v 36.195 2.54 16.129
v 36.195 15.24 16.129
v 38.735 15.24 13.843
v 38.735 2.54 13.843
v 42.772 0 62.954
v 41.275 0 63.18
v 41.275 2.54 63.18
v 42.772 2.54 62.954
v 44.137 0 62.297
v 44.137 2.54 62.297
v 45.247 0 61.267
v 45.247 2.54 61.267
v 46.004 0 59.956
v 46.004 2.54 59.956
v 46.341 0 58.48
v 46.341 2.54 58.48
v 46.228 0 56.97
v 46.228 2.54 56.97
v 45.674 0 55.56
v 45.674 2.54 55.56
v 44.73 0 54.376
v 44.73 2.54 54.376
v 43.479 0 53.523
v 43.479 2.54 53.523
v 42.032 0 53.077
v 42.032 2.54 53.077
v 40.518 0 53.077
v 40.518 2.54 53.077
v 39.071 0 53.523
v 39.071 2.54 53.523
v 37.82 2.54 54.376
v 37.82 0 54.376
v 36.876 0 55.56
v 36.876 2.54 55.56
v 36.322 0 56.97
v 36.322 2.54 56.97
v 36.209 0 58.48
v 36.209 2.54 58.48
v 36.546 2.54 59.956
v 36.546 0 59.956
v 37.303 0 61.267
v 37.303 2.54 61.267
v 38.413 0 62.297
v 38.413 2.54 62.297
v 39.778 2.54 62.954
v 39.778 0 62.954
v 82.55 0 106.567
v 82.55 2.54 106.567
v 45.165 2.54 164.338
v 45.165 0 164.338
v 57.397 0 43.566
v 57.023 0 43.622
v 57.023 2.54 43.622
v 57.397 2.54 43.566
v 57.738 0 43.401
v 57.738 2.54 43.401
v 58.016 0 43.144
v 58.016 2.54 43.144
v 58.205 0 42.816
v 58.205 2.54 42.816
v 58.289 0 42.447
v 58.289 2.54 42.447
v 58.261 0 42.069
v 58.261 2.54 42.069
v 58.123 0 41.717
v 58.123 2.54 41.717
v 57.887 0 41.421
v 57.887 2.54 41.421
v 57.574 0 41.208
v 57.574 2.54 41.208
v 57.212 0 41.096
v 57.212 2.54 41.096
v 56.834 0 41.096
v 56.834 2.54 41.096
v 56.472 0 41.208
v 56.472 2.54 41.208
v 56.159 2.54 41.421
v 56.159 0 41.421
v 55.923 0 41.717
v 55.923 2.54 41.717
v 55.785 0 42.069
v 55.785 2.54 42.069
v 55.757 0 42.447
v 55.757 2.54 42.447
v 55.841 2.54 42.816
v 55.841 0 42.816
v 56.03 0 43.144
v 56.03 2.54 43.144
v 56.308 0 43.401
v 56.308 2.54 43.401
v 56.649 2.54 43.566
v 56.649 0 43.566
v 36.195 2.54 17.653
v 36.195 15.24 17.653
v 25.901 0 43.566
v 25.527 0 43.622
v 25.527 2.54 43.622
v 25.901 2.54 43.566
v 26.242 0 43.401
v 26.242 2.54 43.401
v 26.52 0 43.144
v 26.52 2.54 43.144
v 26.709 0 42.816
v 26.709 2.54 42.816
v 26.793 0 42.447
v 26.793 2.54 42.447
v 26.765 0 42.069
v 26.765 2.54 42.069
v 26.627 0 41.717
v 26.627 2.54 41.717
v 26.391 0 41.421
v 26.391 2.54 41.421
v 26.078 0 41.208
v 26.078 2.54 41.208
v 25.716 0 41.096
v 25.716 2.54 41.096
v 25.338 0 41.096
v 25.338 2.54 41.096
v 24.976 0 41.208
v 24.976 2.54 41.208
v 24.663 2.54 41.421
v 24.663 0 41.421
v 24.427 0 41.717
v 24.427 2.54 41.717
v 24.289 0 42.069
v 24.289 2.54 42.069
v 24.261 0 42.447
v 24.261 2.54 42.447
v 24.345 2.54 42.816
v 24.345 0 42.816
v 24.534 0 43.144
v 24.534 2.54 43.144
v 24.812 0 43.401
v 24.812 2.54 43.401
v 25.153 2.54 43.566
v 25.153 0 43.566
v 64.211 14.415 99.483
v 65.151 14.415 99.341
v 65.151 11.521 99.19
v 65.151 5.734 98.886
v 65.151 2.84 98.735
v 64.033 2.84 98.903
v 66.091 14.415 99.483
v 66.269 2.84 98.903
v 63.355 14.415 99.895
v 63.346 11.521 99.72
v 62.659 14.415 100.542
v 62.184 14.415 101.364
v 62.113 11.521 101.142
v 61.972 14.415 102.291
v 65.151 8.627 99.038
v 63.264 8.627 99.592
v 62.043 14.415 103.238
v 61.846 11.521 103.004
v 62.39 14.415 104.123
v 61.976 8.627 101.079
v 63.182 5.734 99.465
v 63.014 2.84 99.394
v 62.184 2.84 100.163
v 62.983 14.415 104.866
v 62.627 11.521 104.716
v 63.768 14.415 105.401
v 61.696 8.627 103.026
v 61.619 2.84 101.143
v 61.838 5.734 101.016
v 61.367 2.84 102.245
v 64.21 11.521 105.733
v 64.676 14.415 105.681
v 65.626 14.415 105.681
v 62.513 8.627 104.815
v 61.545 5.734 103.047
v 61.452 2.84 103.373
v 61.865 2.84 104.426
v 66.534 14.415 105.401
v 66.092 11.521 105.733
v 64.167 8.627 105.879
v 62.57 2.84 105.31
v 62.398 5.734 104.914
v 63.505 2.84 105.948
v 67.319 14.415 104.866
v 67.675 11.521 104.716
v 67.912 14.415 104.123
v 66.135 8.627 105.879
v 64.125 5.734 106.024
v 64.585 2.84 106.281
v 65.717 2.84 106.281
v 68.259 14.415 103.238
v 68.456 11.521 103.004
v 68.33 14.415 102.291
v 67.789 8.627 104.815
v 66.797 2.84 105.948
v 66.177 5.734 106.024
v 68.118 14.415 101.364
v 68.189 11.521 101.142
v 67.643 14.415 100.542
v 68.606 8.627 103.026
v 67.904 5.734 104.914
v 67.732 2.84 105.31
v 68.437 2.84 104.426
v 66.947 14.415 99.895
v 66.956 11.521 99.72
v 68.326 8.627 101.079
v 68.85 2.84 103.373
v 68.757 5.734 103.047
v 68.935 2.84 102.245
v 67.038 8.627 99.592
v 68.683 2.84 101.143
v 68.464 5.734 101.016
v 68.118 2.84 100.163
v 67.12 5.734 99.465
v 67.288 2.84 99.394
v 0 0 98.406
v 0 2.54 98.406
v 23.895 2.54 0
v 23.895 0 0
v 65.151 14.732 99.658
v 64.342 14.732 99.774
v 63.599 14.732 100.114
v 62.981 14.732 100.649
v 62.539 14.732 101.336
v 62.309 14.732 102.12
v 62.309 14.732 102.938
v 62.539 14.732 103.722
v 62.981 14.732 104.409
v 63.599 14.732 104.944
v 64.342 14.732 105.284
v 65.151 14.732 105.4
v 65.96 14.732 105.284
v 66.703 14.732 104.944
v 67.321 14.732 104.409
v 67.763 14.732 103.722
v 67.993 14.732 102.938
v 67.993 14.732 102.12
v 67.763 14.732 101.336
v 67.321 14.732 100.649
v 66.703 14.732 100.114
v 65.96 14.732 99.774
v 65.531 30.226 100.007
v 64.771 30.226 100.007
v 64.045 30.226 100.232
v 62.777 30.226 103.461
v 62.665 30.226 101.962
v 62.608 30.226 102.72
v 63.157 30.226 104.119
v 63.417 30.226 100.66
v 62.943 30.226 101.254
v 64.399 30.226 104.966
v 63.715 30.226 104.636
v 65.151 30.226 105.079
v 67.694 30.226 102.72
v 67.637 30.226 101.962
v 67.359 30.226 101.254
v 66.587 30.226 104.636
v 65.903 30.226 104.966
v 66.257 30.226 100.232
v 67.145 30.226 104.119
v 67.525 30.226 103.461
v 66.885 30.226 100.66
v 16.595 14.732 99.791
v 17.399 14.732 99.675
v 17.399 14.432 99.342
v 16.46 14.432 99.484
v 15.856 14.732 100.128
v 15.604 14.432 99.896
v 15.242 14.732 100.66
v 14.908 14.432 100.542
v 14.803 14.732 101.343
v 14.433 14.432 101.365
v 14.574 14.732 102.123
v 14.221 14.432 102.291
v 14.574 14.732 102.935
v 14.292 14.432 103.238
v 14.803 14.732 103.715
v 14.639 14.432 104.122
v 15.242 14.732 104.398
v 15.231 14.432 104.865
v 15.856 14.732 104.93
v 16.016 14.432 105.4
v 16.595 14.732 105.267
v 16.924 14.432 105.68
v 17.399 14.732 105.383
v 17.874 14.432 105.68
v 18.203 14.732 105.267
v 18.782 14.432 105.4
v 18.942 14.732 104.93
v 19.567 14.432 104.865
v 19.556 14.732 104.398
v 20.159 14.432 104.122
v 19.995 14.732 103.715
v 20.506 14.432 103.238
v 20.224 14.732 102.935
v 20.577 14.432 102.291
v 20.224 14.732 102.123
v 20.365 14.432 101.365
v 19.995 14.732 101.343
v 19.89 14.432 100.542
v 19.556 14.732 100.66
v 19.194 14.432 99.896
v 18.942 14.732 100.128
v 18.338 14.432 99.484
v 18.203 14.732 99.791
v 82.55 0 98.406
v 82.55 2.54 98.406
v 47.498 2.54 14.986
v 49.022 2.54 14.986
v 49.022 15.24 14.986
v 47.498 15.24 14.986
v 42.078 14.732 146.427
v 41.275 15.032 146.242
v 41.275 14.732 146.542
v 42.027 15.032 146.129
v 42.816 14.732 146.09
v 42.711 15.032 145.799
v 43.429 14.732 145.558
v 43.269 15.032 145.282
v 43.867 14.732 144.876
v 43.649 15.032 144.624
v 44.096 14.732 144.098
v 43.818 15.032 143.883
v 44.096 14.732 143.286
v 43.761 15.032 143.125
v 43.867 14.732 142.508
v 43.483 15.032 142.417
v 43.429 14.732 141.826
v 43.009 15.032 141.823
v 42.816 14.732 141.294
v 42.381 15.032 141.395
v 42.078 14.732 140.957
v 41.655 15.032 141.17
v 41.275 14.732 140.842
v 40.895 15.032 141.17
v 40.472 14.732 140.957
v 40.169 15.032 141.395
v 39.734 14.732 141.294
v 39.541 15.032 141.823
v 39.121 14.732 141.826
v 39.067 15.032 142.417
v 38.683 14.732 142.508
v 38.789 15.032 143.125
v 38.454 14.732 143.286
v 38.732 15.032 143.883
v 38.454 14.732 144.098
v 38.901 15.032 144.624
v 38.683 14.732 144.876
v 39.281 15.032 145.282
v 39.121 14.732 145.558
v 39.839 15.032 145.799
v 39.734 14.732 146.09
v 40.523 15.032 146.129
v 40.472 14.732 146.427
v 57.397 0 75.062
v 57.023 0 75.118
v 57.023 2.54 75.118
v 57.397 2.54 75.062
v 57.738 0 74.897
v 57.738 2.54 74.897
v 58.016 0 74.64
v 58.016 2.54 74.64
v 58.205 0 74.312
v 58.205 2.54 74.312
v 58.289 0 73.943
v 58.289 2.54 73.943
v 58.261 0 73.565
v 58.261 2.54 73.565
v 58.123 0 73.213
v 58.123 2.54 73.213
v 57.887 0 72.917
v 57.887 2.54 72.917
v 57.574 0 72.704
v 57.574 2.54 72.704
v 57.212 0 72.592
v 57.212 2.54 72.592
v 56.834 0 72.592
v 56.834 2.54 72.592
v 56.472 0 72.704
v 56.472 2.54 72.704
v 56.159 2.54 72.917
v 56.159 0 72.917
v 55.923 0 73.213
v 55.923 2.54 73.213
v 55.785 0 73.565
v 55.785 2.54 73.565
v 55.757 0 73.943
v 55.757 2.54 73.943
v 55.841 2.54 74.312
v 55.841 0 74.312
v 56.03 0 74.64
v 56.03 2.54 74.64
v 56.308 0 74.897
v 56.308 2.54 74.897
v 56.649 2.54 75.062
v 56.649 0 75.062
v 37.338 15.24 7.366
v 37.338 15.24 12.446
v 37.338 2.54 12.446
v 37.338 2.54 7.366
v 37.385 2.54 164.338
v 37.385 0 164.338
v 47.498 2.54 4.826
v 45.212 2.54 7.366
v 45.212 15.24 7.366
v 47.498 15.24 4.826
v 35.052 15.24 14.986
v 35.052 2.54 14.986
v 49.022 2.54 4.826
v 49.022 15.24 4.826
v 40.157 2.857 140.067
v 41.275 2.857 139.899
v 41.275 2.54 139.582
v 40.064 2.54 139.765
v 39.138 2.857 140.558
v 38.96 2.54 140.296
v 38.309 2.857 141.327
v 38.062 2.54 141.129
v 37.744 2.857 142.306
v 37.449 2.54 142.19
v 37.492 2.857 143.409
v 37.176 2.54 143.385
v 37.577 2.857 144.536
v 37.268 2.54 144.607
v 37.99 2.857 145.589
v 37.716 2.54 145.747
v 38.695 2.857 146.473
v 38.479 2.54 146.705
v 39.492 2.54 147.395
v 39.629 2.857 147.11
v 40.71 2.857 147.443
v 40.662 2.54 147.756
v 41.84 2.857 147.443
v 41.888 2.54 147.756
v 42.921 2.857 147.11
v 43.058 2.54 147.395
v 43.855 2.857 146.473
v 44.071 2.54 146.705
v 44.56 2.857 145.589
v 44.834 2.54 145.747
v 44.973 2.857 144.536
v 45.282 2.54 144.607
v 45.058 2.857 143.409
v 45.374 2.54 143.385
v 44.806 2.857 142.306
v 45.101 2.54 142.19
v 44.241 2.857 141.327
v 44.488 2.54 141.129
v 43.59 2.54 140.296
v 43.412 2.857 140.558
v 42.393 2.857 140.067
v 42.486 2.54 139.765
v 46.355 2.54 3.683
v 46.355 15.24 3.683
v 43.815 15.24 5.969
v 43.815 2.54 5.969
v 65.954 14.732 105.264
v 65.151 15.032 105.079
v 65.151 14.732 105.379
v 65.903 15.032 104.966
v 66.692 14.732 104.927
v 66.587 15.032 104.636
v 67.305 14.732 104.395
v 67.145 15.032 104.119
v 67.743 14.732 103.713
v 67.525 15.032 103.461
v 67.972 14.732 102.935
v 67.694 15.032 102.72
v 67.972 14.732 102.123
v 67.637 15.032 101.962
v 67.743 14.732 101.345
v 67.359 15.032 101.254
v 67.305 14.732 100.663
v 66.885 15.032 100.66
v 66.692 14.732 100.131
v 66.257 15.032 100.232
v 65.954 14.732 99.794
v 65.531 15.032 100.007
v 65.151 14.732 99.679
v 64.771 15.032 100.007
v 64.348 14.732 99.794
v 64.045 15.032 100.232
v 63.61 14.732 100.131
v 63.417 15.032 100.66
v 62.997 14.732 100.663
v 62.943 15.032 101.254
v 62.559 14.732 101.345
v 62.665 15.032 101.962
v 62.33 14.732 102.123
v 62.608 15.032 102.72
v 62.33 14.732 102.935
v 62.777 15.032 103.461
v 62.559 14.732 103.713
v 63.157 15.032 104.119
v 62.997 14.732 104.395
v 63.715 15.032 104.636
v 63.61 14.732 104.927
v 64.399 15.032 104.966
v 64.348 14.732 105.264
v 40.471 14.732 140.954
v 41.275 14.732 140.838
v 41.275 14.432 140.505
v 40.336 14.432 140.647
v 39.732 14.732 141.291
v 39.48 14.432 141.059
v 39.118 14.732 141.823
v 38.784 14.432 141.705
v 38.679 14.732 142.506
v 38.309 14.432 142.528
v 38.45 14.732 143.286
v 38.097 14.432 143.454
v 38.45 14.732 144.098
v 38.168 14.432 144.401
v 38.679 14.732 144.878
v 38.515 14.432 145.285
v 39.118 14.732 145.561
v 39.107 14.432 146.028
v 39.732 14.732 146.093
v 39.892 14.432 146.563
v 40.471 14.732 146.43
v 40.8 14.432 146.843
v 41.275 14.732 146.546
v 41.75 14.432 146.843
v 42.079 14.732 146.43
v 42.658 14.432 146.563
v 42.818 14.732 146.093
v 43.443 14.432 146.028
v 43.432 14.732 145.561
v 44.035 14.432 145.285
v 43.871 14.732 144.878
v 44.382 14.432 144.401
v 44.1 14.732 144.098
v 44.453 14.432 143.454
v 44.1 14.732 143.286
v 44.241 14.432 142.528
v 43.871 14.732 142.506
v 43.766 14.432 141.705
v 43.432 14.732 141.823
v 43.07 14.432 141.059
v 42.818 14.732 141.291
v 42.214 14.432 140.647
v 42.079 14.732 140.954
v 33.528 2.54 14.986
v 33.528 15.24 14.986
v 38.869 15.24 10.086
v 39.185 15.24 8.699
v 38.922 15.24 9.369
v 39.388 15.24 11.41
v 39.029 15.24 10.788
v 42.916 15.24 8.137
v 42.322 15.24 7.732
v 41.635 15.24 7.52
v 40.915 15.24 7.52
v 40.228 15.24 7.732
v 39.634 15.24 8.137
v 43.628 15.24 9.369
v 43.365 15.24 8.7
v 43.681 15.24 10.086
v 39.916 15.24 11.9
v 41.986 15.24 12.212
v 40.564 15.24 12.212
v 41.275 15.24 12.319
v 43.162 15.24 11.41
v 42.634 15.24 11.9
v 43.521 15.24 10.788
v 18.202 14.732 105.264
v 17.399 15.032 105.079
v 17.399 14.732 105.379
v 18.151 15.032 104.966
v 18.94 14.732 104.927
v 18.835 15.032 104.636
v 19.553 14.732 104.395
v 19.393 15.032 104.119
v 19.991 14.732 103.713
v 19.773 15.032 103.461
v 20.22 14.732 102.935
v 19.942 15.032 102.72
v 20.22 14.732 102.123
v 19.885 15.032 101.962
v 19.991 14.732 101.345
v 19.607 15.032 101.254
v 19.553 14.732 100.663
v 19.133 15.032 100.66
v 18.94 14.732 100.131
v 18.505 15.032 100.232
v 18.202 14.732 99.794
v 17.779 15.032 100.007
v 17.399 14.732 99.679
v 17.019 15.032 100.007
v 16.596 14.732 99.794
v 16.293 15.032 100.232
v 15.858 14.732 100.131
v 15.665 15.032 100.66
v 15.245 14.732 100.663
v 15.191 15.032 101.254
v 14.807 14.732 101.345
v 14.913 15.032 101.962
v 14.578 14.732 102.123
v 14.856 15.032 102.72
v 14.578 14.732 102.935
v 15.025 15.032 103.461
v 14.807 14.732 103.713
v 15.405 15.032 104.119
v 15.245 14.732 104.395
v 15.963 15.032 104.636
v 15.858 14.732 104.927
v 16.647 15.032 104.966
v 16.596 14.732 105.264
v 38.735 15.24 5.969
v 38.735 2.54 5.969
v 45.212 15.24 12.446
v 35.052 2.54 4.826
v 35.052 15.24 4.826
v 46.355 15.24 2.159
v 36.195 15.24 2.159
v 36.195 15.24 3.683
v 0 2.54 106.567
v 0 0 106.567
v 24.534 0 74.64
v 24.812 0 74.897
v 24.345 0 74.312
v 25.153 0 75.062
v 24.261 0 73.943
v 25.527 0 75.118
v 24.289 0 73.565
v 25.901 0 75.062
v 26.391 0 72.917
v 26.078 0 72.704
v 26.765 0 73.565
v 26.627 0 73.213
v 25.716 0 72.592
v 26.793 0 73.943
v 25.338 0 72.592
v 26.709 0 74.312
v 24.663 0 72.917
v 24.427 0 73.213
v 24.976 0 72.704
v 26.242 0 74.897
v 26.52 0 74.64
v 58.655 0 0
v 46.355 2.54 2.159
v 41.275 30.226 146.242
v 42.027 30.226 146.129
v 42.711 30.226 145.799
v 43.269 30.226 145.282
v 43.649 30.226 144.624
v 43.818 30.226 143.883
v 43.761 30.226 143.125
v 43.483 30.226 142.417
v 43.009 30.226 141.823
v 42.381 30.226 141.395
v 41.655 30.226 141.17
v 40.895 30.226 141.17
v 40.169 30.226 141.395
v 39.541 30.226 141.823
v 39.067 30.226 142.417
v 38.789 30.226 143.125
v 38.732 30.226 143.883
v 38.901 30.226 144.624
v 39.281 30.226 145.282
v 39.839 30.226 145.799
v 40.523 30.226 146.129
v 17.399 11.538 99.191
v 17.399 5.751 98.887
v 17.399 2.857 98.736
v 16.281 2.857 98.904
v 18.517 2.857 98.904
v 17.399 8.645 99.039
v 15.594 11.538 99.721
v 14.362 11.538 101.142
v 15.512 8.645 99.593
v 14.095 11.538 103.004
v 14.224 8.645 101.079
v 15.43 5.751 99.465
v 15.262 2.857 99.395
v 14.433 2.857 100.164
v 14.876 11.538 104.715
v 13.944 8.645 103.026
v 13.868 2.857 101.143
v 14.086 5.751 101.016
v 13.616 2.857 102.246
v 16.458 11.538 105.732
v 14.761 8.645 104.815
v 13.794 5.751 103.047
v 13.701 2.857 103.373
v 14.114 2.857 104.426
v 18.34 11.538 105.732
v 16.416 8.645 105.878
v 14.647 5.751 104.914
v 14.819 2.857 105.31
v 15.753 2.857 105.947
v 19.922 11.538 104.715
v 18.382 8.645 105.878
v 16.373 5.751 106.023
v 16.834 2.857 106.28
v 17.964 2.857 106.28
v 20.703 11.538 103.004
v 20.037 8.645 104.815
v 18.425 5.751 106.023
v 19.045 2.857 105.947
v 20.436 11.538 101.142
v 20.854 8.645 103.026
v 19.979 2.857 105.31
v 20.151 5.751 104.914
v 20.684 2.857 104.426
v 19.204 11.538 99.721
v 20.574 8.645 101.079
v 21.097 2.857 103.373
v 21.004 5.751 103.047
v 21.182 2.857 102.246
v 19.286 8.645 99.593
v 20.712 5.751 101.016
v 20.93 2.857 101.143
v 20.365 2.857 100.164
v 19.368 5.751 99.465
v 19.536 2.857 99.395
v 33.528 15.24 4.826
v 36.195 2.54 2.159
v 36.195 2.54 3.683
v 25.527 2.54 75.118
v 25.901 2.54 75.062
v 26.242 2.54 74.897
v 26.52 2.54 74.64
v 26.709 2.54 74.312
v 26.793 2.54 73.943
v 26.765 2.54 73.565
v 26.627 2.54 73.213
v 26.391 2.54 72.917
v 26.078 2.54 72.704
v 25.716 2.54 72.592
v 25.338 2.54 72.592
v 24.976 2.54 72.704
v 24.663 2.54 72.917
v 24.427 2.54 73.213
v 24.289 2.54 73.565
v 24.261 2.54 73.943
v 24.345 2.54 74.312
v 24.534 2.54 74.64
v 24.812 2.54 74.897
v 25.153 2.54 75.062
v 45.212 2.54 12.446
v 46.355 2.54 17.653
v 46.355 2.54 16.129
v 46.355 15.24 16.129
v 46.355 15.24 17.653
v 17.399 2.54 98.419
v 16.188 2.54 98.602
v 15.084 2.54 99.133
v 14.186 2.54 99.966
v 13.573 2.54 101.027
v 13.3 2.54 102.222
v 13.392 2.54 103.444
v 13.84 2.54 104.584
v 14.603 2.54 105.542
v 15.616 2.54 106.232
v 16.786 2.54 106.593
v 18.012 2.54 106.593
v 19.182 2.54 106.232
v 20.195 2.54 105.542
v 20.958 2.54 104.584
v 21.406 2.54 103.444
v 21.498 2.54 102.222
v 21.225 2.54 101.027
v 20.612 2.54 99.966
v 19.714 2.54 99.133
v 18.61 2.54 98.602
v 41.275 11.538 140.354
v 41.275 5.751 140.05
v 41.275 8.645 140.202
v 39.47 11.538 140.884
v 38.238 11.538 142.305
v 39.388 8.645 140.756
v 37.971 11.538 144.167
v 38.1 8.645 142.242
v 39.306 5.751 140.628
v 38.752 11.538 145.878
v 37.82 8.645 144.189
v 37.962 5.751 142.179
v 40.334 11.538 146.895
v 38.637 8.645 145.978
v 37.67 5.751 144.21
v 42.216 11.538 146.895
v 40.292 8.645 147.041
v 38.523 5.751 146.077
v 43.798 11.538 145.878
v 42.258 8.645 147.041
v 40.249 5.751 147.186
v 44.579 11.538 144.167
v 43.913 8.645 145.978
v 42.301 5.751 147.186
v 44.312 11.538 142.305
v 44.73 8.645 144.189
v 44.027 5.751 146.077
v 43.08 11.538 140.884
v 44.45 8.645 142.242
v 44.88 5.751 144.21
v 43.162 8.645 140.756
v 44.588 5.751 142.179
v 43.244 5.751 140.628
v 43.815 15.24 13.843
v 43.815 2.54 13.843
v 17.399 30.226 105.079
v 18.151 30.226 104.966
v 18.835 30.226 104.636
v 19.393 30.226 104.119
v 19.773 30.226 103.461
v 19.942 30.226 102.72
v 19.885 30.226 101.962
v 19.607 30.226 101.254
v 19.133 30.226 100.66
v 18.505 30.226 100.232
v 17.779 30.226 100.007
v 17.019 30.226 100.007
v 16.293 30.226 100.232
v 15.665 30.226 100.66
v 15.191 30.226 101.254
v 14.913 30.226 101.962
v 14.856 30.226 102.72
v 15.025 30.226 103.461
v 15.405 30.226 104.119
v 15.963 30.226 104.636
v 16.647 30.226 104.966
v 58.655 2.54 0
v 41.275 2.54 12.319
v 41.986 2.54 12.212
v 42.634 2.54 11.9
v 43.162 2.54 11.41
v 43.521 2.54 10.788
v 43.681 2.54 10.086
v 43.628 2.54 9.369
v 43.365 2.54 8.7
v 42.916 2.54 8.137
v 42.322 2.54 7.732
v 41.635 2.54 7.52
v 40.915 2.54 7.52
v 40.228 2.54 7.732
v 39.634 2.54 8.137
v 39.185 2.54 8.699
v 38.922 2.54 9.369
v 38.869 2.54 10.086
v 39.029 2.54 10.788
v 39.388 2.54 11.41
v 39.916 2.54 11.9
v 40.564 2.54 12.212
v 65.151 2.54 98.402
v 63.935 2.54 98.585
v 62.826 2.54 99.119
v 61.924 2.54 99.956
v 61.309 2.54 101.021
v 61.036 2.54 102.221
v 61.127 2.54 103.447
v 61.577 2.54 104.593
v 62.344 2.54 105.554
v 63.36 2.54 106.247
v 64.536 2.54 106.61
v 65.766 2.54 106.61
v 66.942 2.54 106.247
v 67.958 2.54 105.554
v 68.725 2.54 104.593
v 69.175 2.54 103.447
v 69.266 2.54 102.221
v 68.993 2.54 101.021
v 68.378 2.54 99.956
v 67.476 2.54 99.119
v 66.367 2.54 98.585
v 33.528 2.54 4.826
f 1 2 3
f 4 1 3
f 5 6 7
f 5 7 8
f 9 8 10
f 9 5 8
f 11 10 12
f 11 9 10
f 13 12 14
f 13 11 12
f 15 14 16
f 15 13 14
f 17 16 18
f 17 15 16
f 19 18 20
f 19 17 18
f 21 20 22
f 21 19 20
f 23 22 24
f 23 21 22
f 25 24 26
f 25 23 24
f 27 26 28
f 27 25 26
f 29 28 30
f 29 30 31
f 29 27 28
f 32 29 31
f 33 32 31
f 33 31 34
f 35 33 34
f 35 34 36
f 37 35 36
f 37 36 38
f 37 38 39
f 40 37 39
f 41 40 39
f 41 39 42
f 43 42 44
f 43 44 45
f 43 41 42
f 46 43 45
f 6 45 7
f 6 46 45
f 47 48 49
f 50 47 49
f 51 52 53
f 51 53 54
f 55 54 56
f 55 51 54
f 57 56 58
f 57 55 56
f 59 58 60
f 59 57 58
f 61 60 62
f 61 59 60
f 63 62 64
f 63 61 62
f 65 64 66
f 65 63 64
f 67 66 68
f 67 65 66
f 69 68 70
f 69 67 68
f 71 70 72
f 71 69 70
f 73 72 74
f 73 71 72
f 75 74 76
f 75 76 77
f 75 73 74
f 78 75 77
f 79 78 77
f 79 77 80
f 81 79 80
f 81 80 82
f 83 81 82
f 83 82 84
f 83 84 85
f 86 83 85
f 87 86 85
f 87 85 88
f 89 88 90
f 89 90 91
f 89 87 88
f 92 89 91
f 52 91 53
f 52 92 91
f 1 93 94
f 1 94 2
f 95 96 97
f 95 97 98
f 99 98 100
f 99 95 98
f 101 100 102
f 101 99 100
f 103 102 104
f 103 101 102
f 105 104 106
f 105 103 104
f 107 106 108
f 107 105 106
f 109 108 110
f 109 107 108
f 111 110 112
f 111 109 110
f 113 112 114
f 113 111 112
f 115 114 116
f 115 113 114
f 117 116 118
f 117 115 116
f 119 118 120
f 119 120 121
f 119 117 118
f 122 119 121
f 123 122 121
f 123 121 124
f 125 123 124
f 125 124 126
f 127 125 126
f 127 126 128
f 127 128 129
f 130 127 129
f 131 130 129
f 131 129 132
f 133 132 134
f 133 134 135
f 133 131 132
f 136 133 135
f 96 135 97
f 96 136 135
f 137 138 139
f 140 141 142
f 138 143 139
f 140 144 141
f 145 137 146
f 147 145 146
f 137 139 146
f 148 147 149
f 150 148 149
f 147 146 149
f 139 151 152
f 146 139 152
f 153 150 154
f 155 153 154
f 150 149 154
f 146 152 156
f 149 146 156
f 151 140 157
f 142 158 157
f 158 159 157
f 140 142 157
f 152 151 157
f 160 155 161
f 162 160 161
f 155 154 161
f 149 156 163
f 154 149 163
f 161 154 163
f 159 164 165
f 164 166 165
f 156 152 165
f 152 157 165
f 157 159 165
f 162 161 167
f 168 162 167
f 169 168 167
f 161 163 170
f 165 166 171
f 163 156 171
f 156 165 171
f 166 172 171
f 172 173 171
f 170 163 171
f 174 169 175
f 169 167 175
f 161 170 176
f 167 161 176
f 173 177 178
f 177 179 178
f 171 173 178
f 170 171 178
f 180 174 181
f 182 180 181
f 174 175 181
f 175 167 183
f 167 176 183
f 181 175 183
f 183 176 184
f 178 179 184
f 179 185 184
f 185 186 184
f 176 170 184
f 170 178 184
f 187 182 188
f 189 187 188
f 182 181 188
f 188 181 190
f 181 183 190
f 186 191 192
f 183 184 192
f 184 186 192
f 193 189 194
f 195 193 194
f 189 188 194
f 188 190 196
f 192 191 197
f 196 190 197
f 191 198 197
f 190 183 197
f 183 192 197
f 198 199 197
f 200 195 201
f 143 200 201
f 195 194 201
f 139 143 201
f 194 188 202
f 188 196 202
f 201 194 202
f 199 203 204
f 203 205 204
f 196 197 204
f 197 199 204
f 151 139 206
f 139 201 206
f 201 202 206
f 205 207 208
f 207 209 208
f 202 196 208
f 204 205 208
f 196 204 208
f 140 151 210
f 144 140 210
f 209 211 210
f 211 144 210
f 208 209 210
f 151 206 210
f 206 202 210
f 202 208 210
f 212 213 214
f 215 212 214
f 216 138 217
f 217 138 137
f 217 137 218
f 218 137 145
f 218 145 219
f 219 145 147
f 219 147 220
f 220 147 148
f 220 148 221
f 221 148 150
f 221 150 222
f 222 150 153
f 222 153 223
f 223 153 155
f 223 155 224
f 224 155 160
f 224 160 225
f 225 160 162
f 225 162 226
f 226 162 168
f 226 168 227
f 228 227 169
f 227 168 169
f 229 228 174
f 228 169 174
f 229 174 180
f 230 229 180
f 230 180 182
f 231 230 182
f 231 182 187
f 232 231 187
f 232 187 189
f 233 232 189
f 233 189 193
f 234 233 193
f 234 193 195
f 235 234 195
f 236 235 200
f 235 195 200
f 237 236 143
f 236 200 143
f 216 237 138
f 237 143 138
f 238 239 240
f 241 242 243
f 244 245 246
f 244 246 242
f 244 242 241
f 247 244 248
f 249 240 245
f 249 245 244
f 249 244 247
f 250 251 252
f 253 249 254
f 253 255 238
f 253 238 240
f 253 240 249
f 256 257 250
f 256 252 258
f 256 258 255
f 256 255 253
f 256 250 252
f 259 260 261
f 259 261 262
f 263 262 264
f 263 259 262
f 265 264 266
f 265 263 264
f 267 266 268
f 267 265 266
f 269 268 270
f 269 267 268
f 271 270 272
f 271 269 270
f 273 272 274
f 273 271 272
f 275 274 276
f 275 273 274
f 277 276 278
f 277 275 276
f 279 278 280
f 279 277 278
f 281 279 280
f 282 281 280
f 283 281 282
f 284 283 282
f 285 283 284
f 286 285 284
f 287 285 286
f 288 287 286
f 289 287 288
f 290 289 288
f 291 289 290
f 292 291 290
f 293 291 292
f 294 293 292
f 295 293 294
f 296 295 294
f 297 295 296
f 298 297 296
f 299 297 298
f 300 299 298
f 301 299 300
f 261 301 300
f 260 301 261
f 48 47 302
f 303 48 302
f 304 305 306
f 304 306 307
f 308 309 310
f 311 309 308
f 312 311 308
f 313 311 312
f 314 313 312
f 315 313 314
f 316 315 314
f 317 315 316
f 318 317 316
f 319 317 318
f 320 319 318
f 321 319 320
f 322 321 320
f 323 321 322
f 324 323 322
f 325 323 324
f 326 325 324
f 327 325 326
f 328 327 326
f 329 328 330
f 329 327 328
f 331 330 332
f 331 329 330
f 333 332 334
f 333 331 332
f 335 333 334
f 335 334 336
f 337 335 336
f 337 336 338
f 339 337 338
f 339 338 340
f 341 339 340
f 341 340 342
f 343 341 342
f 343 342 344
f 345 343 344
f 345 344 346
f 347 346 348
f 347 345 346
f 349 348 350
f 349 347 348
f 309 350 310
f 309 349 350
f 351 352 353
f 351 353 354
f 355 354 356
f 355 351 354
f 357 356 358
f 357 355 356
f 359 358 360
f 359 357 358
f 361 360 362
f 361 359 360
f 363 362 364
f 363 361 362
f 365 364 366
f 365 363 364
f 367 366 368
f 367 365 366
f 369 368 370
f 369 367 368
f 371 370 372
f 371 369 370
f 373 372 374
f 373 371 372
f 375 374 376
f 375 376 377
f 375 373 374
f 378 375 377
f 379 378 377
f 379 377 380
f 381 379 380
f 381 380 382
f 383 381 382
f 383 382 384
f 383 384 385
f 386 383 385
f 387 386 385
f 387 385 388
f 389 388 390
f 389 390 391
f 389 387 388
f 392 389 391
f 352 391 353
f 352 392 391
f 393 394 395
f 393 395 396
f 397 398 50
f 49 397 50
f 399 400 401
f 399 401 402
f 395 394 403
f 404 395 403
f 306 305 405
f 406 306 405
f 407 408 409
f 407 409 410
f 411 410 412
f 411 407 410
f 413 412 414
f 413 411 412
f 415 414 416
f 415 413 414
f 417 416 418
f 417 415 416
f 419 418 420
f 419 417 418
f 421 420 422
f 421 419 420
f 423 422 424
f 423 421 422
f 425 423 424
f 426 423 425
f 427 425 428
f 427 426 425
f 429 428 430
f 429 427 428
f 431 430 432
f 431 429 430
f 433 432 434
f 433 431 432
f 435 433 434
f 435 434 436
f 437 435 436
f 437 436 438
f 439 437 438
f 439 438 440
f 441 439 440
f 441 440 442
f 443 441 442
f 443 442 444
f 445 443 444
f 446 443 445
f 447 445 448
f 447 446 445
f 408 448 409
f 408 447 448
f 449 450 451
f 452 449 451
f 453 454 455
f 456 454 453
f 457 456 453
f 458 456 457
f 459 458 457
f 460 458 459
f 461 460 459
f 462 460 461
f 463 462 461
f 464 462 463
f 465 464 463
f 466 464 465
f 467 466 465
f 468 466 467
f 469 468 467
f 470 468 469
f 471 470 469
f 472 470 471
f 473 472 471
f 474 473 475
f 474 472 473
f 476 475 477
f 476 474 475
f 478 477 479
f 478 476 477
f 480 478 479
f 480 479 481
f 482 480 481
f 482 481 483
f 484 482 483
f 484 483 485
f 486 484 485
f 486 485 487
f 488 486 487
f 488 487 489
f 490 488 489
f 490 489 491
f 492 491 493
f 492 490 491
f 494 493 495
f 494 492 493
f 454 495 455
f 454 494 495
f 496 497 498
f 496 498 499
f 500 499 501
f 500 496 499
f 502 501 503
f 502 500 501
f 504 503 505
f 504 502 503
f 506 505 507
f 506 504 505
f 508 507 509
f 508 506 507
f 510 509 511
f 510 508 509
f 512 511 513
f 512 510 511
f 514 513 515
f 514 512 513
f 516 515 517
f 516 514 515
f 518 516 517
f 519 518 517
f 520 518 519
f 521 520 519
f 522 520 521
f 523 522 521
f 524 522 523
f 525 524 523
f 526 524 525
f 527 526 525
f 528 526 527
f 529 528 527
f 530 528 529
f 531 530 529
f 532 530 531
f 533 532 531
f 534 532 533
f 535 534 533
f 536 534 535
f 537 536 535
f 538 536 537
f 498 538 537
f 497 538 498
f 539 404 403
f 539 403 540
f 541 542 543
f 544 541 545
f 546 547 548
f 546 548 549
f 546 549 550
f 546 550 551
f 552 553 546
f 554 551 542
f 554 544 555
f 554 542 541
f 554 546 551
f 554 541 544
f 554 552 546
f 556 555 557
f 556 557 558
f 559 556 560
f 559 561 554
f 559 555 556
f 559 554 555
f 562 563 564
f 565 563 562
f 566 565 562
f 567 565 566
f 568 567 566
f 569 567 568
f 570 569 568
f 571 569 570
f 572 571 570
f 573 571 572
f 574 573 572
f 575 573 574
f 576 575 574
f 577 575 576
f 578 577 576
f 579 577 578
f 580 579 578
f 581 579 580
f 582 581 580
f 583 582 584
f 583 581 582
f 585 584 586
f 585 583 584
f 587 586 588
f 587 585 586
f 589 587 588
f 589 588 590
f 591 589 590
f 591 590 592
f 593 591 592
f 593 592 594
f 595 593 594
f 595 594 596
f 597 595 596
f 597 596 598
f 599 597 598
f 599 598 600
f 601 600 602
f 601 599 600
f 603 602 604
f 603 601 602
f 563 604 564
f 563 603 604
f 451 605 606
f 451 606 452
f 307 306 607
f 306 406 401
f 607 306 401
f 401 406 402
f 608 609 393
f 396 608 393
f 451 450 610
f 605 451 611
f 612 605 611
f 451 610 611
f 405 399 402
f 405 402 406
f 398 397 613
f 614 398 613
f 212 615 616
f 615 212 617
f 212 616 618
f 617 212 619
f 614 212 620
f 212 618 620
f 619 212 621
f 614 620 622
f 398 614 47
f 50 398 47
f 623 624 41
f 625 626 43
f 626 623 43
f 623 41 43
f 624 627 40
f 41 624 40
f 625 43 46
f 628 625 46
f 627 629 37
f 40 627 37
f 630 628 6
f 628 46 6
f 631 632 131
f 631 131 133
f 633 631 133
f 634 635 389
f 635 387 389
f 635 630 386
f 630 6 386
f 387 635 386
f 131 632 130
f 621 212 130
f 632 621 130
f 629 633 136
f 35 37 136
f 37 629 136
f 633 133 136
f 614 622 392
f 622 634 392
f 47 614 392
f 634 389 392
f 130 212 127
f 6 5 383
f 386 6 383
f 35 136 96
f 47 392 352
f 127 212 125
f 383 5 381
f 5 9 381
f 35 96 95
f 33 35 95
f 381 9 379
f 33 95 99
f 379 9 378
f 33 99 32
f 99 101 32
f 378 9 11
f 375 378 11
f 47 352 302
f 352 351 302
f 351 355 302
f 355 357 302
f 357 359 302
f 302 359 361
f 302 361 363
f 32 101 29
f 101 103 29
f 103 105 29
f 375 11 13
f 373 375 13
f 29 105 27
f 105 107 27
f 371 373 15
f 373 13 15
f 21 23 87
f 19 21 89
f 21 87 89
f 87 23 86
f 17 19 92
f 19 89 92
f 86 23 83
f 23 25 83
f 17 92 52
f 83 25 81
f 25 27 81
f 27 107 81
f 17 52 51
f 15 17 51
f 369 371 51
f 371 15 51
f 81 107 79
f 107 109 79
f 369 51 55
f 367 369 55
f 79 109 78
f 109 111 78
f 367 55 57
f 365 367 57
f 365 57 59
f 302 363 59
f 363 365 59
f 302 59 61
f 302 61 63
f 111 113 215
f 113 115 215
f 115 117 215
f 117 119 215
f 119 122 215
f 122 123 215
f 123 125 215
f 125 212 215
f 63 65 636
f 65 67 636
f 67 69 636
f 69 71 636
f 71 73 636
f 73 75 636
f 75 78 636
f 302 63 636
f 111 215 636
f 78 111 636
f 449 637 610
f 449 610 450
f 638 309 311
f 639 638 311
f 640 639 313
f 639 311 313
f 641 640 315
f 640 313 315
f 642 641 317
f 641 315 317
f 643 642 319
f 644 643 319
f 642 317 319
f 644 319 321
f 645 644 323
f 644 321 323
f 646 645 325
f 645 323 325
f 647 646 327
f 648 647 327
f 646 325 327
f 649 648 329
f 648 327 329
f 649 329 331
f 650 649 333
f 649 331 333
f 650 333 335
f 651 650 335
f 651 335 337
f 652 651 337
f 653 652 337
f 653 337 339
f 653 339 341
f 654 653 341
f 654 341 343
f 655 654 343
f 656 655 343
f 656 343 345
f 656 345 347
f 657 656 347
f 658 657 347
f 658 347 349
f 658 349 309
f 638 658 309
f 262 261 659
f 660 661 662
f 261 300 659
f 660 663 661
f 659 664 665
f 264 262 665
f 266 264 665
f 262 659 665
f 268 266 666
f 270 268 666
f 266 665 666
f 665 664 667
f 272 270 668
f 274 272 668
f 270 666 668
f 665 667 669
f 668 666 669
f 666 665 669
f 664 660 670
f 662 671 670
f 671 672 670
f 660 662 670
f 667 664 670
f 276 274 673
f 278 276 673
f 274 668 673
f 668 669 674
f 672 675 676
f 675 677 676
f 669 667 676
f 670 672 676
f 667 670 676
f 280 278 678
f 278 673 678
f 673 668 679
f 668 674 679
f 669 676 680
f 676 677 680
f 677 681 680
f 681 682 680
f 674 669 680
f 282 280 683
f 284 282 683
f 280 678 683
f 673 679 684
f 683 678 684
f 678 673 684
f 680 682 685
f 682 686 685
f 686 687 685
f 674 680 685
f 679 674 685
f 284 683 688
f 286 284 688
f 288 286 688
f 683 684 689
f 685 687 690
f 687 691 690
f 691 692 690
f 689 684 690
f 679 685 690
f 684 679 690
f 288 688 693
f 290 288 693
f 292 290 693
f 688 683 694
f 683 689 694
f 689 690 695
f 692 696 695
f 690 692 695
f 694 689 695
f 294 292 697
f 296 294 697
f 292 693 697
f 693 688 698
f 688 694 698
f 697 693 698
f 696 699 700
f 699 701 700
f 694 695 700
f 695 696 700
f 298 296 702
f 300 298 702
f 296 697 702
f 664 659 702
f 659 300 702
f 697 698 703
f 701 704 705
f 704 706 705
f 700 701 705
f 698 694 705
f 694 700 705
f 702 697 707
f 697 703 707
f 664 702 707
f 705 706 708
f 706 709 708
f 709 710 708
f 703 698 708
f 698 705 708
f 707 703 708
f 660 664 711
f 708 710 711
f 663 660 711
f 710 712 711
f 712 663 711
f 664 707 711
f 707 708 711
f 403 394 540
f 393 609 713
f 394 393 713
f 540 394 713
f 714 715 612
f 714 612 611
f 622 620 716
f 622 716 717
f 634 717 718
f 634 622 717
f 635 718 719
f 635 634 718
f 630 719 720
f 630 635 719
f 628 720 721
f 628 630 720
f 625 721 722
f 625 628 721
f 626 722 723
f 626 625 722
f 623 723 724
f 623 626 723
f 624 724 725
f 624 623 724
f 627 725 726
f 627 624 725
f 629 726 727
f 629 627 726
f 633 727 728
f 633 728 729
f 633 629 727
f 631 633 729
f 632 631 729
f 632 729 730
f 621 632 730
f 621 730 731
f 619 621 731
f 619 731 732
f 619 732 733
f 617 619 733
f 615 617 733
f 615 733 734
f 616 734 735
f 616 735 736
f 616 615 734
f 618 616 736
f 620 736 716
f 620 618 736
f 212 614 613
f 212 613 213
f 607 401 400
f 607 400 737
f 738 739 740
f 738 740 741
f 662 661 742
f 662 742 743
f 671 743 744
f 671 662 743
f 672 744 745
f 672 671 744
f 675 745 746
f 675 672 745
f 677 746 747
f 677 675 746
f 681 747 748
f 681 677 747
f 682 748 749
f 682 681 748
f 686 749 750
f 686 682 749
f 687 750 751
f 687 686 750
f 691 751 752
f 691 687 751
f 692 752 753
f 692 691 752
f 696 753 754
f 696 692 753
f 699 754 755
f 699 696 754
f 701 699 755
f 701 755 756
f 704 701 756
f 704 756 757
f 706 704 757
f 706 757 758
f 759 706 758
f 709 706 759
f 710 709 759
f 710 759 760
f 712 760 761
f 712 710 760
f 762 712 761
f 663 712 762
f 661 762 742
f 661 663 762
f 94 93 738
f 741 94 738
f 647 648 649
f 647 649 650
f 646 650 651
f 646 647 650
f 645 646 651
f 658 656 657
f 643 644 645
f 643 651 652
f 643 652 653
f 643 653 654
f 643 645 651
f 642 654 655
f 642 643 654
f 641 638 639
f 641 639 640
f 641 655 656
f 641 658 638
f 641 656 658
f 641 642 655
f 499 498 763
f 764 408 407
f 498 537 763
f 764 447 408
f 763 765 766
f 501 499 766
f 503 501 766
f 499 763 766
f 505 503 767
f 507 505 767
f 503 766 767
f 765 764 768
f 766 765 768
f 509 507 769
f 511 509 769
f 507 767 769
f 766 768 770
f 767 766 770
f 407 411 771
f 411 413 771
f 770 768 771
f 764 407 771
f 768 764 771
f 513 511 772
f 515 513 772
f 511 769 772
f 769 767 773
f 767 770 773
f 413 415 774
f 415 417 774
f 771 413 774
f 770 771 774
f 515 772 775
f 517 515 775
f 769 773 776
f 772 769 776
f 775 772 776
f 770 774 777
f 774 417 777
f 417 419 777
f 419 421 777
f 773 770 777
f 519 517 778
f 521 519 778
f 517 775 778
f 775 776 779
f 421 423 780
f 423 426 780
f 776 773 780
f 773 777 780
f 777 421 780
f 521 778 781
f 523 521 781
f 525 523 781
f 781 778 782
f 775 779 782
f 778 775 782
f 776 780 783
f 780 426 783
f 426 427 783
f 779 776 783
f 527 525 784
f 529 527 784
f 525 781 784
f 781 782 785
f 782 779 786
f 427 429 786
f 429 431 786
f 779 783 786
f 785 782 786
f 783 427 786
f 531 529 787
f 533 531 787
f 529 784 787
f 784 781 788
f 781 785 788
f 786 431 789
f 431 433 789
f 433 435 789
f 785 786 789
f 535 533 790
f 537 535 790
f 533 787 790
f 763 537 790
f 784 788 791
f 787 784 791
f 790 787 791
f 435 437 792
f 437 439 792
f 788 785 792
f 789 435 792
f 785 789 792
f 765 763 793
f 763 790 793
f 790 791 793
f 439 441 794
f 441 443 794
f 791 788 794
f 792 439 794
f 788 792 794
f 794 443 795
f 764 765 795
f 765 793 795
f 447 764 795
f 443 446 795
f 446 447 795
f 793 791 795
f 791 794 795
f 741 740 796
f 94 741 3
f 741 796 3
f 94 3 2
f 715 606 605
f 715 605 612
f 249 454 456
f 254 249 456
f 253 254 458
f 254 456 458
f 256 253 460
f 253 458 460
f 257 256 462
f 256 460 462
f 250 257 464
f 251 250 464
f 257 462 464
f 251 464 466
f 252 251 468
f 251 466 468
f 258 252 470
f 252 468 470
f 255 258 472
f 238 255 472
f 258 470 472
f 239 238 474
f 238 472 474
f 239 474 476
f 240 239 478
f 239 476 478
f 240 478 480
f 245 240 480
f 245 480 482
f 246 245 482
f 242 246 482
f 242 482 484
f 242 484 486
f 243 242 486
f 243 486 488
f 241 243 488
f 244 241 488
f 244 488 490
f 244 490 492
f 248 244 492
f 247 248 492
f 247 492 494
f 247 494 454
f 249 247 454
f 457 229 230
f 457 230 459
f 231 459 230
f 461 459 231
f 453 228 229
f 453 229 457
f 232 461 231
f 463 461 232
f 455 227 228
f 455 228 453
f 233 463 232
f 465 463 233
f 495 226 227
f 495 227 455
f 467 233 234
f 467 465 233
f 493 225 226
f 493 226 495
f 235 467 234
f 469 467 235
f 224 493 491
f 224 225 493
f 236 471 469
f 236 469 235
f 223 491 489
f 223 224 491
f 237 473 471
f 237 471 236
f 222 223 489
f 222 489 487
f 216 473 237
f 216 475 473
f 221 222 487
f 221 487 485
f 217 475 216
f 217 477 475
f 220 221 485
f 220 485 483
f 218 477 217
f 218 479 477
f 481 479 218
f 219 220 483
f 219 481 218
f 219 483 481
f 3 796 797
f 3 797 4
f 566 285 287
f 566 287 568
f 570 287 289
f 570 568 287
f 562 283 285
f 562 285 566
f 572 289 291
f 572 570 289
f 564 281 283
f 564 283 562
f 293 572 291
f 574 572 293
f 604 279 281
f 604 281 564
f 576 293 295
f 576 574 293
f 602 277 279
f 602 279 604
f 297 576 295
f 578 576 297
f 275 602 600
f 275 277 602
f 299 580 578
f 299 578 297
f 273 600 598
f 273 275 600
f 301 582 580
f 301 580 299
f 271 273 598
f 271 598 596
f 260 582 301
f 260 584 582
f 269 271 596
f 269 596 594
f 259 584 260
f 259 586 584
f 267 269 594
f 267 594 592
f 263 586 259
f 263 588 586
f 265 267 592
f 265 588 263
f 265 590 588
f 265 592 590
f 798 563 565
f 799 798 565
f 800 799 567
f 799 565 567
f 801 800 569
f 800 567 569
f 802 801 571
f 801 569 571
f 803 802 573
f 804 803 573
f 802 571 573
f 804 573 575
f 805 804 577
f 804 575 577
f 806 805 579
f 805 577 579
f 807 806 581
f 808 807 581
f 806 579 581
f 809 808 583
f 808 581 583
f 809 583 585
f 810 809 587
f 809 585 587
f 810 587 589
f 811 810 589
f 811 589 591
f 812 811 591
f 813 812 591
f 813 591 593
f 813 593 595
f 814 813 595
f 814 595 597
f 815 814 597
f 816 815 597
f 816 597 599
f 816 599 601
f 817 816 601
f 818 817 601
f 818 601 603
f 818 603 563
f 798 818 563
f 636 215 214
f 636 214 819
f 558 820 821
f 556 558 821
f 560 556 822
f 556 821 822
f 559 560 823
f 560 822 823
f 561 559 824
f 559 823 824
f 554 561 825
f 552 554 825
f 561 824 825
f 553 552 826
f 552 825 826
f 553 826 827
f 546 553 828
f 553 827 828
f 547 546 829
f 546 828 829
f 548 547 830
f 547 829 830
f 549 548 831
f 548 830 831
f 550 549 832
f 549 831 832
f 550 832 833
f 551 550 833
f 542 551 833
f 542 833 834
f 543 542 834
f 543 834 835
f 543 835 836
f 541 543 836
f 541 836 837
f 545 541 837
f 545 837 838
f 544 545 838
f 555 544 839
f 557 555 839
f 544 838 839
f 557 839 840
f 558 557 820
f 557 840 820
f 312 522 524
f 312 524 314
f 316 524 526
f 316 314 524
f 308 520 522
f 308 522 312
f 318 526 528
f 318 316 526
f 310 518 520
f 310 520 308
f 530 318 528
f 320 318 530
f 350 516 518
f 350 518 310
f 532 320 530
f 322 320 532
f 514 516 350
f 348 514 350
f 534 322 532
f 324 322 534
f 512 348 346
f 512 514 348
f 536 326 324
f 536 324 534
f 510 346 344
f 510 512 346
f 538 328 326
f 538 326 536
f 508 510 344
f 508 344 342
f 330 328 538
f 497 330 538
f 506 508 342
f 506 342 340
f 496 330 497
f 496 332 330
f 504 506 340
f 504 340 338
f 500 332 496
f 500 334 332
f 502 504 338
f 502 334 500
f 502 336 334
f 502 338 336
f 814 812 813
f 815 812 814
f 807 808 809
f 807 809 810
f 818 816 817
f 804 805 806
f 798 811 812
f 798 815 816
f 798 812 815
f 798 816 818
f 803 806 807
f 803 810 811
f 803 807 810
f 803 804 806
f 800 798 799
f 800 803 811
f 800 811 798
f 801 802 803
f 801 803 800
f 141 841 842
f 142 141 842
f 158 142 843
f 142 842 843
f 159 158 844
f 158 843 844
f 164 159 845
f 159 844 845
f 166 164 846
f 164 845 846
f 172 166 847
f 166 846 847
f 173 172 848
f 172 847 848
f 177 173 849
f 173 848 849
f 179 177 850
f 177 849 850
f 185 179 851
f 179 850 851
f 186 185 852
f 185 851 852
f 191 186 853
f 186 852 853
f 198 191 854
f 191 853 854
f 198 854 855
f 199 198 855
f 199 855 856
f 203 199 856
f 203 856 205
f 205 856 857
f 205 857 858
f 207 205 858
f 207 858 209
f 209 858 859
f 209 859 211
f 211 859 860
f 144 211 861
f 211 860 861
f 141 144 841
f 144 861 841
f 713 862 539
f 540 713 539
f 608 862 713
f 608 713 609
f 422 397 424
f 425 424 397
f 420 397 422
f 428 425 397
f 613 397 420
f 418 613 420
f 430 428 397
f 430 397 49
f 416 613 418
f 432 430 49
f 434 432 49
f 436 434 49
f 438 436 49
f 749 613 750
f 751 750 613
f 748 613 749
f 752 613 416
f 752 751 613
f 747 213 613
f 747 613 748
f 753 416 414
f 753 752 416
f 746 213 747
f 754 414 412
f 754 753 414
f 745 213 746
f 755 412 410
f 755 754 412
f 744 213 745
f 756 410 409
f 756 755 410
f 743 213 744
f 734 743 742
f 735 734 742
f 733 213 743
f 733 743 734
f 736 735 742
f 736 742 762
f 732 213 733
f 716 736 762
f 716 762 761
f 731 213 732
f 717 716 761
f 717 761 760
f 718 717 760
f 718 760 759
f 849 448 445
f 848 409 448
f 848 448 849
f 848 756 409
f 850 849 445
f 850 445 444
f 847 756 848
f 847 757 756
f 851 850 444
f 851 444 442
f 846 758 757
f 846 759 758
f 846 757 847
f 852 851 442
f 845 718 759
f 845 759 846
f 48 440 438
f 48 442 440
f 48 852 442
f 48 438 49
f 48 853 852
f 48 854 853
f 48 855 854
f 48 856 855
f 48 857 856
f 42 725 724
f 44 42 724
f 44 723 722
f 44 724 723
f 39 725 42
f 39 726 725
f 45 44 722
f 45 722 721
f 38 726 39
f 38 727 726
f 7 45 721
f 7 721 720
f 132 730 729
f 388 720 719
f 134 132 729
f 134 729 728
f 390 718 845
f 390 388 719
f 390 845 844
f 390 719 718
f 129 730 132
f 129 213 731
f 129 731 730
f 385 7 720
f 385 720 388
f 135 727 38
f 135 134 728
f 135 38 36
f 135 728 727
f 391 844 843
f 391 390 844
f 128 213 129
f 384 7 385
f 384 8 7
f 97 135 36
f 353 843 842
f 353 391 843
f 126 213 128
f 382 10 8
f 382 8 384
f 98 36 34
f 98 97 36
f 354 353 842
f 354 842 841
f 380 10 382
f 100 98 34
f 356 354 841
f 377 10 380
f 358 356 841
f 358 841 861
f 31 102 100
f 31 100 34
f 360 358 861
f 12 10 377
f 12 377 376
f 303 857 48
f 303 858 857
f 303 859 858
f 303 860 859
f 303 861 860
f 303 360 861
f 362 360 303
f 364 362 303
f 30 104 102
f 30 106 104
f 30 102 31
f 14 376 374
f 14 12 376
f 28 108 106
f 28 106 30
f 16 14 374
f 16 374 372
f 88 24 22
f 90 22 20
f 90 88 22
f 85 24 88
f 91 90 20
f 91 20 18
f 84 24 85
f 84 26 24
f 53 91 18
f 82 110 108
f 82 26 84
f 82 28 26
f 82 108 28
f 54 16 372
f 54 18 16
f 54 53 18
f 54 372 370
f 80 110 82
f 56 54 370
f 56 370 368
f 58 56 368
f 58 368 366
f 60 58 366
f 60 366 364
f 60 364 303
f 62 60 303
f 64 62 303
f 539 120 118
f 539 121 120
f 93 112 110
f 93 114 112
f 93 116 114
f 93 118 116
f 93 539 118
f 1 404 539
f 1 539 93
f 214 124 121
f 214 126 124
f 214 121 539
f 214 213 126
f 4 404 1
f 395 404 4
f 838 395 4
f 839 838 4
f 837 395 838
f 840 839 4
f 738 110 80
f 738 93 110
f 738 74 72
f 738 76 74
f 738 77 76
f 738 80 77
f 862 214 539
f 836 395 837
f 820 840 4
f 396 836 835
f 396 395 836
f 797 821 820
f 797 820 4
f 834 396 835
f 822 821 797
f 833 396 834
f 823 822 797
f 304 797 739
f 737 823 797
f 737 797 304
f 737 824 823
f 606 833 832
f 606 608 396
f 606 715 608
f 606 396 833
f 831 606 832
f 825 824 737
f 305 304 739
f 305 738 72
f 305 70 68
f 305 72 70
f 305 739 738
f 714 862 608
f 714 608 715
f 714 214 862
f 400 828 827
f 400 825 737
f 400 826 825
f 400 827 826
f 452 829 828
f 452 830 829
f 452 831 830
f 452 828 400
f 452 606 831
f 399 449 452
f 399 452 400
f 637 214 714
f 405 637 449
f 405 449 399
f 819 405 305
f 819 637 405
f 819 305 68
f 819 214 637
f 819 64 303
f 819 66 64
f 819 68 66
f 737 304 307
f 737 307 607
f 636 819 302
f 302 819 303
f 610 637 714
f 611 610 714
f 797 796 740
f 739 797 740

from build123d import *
from OCP.BRepFilletAPI import BRepFilletAPI_MakeChamfer

# Parameters (mm, degrees)
SKETCH1_W               = 82.55
SKETCH1_H               = 164.338
SKETCH1_R               = 5.08
SKETCH1_R_2             = 1.27
BASE_EXTRUDE_DEPTH      = 2.54
SKETCH6_R               = 2.413
MIDDLE_BAR_HOLDER_DEPTH = 12.7
SKETCH7_R               = 2.55
BOSS_EXTRUDE6_DEPTH     = 27.686
SKETCH7_3_R             = 3.81
SKETCH7_3_R_2           = 2.55
BOSS_EXTRUDE7_DEPTH     = 12.192
CUT_EXTRUDE1_DEPTH      = 10
DRAFT4_ANGLE            = 4
DRAFT5_ANGLE            = 3
CHAMFER1_SIZE           = 0.3
CHAMFER1_SIZE2          = 0.317026351
CHAMFER2_SIZE           = 0.3
CHAMFER2_SIZE2          = 0.317026351
CHAMFER3_SIZE           = 0.3
CHAMFER3_SIZE2          = 0.317026351


with BuildPart() as part:
    # Sketch1 → base extrude (new body)
    with BuildSketch(Plane(origin=(0, 0, 0), x_dir=(1, 0, 0), z_dir=(0, 1, 0))):
        with Locations((41.275, -82.169)):
            Rectangle(SKETCH1_W, SKETCH1_H)
        with Locations(Location((41.275, -58.1000108, 0), (0, 0, 270))):
            Circle(SKETCH1_R, mode=Mode.SUBTRACT)
        with Locations(Location((57.023, -42.3520108, 0), (0, 0, 270))):
            Circle(SKETCH1_R_2, mode=Mode.SUBTRACT)
        with Locations(Location((57.023, -73.8480108, 0), (0, 0, 270))):
            Circle(SKETCH1_R_2, mode=Mode.SUBTRACT)
        with Locations(Location((25.527, -73.8480108, 0), (0, 0, 270))):
            Circle(SKETCH1_R_2, mode=Mode.SUBTRACT)
        with Locations(Location((25.527, -42.3520108, 0), (0, 0, 270))):
            Circle(SKETCH1_R_2, mode=Mode.SUBTRACT)
    extrude(amount=BASE_EXTRUDE_DEPTH)

    # Sketch6 → middle bar holder (add)
    with BuildSketch(Plane(origin=(0, 2.54, 0), x_dir=(1, 0, 0), z_dir=(0, 1, 0))):
        Polygon((33.528, -9.906), (33.528, -4.826), (35.052, -4.826), (37.338, -7.366), (37.338, -9.906), (37.338, -12.446), (35.052, -14.986), (33.528, -14.986), align=None)
        with Locations(Location((41.275, -9.906, 0), (0, 0, 270))):
            Circle(SKETCH6_R)
        Polygon((41.275, -2.159), (46.355, -2.159), (46.355, -3.683), (43.815, -5.969), (41.275, -5.969), (38.735, -5.969), (36.195, -3.683), (36.195, -2.159), align=None)
        Polygon((47.498, -14.986), (45.212, -12.446), (45.212, -9.906), (45.212, -7.366), (47.498, -4.826), (49.022, -4.826), (49.022, -9.906), (49.022, -14.986), align=None)
        Polygon((41.275, -17.653), (36.195, -17.653), (36.195, -16.129), (38.735, -13.843), (41.275, -13.843), (43.815, -13.843), (46.355, -16.129), (46.355, -17.653), align=None)
    extrude(amount=MIDDLE_BAR_HOLDER_DEPTH)

    # Sketch7 → Boss-Extrude6 (add)
    with BuildSketch(Plane(origin=(0, 2.54, 0), x_dir=(1, 0, 0), z_dir=(0, 1, 0))):
        with Locations(Location((17.399, -102.529, 0), (0, 0, 270))):
            Circle(SKETCH7_R)
        with Locations(Location((41.275, -143.692, 0), (0, 0, 270))):
            Circle(SKETCH7_R)
        with Locations(Location((65.151, -102.529, 0), (0, 0, 270))):
            Circle(SKETCH7_R)
    extrude(amount=BOSS_EXTRUDE6_DEPTH)

    # Sketch7<3> → Boss-Extrude7 (add)
    # profile 1 of 3: a face of its own
    with BuildSketch(Plane(origin=(0, 2.54, 0), x_dir=(1, 0, 0), z_dir=(0, 1, 0))):
        with Locations(Location((41.275, -143.692, 0), (0, 0, 90))):
            Circle(SKETCH7_3_R)
        with Locations(Location((41.275, -143.692, 0), (0, 0, 270))):
            Circle(SKETCH7_3_R_2, mode=Mode.SUBTRACT)
    # profile 2 of 3: a face of its own
    with BuildSketch(Plane(origin=(0, 2.54, 0), x_dir=(1, 0, 0), z_dir=(0, 1, 0))):
        with Locations(Location((65.151, -102.529, 0), (0, 0, 90))):
            Circle(SKETCH7_3_R)
        with Locations(Location((65.151, -102.529, 0), (0, 0, 270))):
            Circle(SKETCH7_3_R_2, mode=Mode.SUBTRACT)
    # profile 3 of 3: a face of its own
    with BuildSketch(Plane(origin=(0, 2.54, 0), x_dir=(1, 0, 0), z_dir=(0, 1, 0))):
        with Locations(Location((17.399, -102.529, 0), (0, 0, 90))):
            Circle(SKETCH7_3_R)
        with Locations(Location((17.399, -102.529, 0), (0, 0, 270))):
            Circle(SKETCH7_3_R_2, mode=Mode.SUBTRACT)
    extrude(amount=BOSS_EXTRUDE7_DEPTH)

    # Sketch8 → Cut-Extrude1 (cut)
    with BuildSketch(Plane(origin=(0, 2.54, 0), x_dir=(1, 0, 0), z_dir=(0, 1, 0))):
        Polygon((0, -164.338), (37.384522851, -164.338), (0, -106.566701997), align=None)
        Polygon((82.55, -106.566701997), (45.165477149, -164.338), (82.55, -164.338), align=None)
        Polygon((58.654991564, 0), (82.55, -98.406378462), (82.55, 0), align=None)
        Polygon((0, 0), (0, -98.406378462), (23.895008436, 0), align=None)
    extrude(amount=-CUT_EXTRUDE1_DEPTH, mode=Mode.SUBTRACT)

    # Draft4
    draft4_faces = [part.faces().sort_by_distance(p)[0] for p in [
        (41.275, 8.636, 147.502),
        (17.399, 8.636, 106.339),
        (65.151, 8.636, 106.339),
    ]]
    draft(draft4_faces, Plane.ZX.offset(2.54), DRAFT4_ANGLE)

    # Draft5
    draft5_faces = [part.faces().sort_by_distance(p)[0] for p in [
        (41.275, 8.636, 147.075726154),
        (65.151, 8.636, 105.912726154),
        (17.399, 8.636, 105.912726154),
    ]]
    draft(draft5_faces, Plane.ZX.offset(2.54), DRAFT5_ANGLE)

    # Chamfer1: one chamfer whose edges measure the first distance from different faces: ONE call of the kernel's chamfer builder (chamfer() names one face for all edges)
    chamfer1_edges_1 = [part.edges().sort_by_distance(p)[0] for p in [
        (65.151, 14.732, 99.979),
    ]]
    chamfer1_edges_2 = [part.edges().sort_by_distance(p)[0] for p in [
        (65.151, 2.54, 106.339),
    ]]
    chamfer1_side_2 = [part.faces().sort_by_distance(p)[0] for p in [
        (65.151, 8.636, 106.019522177),
    ]]
    chamfer1_edges_3 = [part.edges().sort_by_distance(p)[0] for p in [
        (65.151, 14.732, 105.700044355),
    ]]
    chamfer1_side_3 = [part.faces().sort_by_distance(p)[0] for p in [
        (65.151, 14.732, 105.610353676),
    ]]
    chamfer1 = BRepFilletAPI_MakeChamfer(part.part.solid().wrapped)
    for e in chamfer1_edges_1:
        chamfer1.Add(CHAMFER1_SIZE, e.wrapped)
    for e in chamfer1_edges_2:
        chamfer1.Add(CHAMFER1_SIZE, CHAMFER1_SIZE2, e.wrapped, chamfer1_side_2[0].wrapped)  # the first distance lies on this face
    for e in chamfer1_edges_3:
        chamfer1.Add(CHAMFER1_SIZE, CHAMFER1_SIZE2, e.wrapped, chamfer1_side_3[0].wrapped)  # the first distance lies on this face
    add(Compound.cast(chamfer1.Shape()), mode=Mode.REPLACE)

    # Chamfer2: one chamfer whose edges measure the first distance from different faces: ONE call of the kernel's chamfer builder (chamfer() names one face for all edges)
    chamfer2_edges_1 = [part.edges().sort_by_distance(p)[0] for p in [
        (17.399, 14.732, 99.979),
    ]]
    chamfer2_edges_2 = [part.edges().sort_by_distance(p)[0] for p in [
        (17.399, 2.54, 106.339),
    ]]
    chamfer2_side_2 = [part.faces().sort_by_distance(p)[0] for p in [
        (41.253202906, 2.54, 80.858952194),
    ]]
    chamfer2_edges_3 = [part.edges().sort_by_distance(p)[0] for p in [
        (17.399, 14.732, 105.700044355),
    ]]
    chamfer2_side_3 = [part.faces().sort_by_distance(p)[0] for p in [
        (17.399, 8.636, 106.019522177),
    ]]
    chamfer2 = BRepFilletAPI_MakeChamfer(part.part.solid().wrapped)
    for e in chamfer2_edges_1:
        chamfer2.Add(CHAMFER2_SIZE, e.wrapped)
    for e in chamfer2_edges_2:
        chamfer2.Add(CHAMFER2_SIZE, CHAMFER2_SIZE2, e.wrapped, chamfer2_side_2[0].wrapped)  # the first distance lies on this face
    for e in chamfer2_edges_3:
        chamfer2.Add(CHAMFER2_SIZE, CHAMFER2_SIZE2, e.wrapped, chamfer2_side_3[0].wrapped)  # the first distance lies on this face
    add(Compound.cast(chamfer2.Shape()), mode=Mode.REPLACE)

    # Chamfer3: one chamfer whose edges measure the first distance from different faces: ONE call of the kernel's chamfer builder (chamfer() names one face for all edges)
    chamfer3_edges_1 = [part.edges().sort_by_distance(p)[0] for p in [
        (41.275, 14.732, 141.142),
    ]]
    chamfer3_edges_2 = [part.edges().sort_by_distance(p)[0] for p in [
        (41.275, 2.54, 147.502),
    ]]
    chamfer3_side_2 = [part.faces().sort_by_distance(p)[0] for p in [
        (41.27378406, 2.54, 80.840255506),
    ]]
    chamfer3_edges_3 = [part.edges().sort_by_distance(p)[0] for p in [
        (41.275, 14.732, 146.863044355),
    ]]
    chamfer3_side_3 = [part.faces().sort_by_distance(p)[0] for p in [
        (41.275, 8.636, 147.182522177),
    ]]
    chamfer3 = BRepFilletAPI_MakeChamfer(part.part.solid().wrapped)
    for e in chamfer3_edges_1:
        chamfer3.Add(CHAMFER3_SIZE, e.wrapped)
    for e in chamfer3_edges_2:
        chamfer3.Add(CHAMFER3_SIZE, CHAMFER3_SIZE2, e.wrapped, chamfer3_side_2[0].wrapped)  # the first distance lies on this face
    for e in chamfer3_edges_3:
        chamfer3.Add(CHAMFER3_SIZE, CHAMFER3_SIZE2, e.wrapped, chamfer3_side_3[0].wrapped)  # the first distance lies on this face
    add(Compound.cast(chamfer3.Shape()), mode=Mode.REPLACE)


solid = part.part
